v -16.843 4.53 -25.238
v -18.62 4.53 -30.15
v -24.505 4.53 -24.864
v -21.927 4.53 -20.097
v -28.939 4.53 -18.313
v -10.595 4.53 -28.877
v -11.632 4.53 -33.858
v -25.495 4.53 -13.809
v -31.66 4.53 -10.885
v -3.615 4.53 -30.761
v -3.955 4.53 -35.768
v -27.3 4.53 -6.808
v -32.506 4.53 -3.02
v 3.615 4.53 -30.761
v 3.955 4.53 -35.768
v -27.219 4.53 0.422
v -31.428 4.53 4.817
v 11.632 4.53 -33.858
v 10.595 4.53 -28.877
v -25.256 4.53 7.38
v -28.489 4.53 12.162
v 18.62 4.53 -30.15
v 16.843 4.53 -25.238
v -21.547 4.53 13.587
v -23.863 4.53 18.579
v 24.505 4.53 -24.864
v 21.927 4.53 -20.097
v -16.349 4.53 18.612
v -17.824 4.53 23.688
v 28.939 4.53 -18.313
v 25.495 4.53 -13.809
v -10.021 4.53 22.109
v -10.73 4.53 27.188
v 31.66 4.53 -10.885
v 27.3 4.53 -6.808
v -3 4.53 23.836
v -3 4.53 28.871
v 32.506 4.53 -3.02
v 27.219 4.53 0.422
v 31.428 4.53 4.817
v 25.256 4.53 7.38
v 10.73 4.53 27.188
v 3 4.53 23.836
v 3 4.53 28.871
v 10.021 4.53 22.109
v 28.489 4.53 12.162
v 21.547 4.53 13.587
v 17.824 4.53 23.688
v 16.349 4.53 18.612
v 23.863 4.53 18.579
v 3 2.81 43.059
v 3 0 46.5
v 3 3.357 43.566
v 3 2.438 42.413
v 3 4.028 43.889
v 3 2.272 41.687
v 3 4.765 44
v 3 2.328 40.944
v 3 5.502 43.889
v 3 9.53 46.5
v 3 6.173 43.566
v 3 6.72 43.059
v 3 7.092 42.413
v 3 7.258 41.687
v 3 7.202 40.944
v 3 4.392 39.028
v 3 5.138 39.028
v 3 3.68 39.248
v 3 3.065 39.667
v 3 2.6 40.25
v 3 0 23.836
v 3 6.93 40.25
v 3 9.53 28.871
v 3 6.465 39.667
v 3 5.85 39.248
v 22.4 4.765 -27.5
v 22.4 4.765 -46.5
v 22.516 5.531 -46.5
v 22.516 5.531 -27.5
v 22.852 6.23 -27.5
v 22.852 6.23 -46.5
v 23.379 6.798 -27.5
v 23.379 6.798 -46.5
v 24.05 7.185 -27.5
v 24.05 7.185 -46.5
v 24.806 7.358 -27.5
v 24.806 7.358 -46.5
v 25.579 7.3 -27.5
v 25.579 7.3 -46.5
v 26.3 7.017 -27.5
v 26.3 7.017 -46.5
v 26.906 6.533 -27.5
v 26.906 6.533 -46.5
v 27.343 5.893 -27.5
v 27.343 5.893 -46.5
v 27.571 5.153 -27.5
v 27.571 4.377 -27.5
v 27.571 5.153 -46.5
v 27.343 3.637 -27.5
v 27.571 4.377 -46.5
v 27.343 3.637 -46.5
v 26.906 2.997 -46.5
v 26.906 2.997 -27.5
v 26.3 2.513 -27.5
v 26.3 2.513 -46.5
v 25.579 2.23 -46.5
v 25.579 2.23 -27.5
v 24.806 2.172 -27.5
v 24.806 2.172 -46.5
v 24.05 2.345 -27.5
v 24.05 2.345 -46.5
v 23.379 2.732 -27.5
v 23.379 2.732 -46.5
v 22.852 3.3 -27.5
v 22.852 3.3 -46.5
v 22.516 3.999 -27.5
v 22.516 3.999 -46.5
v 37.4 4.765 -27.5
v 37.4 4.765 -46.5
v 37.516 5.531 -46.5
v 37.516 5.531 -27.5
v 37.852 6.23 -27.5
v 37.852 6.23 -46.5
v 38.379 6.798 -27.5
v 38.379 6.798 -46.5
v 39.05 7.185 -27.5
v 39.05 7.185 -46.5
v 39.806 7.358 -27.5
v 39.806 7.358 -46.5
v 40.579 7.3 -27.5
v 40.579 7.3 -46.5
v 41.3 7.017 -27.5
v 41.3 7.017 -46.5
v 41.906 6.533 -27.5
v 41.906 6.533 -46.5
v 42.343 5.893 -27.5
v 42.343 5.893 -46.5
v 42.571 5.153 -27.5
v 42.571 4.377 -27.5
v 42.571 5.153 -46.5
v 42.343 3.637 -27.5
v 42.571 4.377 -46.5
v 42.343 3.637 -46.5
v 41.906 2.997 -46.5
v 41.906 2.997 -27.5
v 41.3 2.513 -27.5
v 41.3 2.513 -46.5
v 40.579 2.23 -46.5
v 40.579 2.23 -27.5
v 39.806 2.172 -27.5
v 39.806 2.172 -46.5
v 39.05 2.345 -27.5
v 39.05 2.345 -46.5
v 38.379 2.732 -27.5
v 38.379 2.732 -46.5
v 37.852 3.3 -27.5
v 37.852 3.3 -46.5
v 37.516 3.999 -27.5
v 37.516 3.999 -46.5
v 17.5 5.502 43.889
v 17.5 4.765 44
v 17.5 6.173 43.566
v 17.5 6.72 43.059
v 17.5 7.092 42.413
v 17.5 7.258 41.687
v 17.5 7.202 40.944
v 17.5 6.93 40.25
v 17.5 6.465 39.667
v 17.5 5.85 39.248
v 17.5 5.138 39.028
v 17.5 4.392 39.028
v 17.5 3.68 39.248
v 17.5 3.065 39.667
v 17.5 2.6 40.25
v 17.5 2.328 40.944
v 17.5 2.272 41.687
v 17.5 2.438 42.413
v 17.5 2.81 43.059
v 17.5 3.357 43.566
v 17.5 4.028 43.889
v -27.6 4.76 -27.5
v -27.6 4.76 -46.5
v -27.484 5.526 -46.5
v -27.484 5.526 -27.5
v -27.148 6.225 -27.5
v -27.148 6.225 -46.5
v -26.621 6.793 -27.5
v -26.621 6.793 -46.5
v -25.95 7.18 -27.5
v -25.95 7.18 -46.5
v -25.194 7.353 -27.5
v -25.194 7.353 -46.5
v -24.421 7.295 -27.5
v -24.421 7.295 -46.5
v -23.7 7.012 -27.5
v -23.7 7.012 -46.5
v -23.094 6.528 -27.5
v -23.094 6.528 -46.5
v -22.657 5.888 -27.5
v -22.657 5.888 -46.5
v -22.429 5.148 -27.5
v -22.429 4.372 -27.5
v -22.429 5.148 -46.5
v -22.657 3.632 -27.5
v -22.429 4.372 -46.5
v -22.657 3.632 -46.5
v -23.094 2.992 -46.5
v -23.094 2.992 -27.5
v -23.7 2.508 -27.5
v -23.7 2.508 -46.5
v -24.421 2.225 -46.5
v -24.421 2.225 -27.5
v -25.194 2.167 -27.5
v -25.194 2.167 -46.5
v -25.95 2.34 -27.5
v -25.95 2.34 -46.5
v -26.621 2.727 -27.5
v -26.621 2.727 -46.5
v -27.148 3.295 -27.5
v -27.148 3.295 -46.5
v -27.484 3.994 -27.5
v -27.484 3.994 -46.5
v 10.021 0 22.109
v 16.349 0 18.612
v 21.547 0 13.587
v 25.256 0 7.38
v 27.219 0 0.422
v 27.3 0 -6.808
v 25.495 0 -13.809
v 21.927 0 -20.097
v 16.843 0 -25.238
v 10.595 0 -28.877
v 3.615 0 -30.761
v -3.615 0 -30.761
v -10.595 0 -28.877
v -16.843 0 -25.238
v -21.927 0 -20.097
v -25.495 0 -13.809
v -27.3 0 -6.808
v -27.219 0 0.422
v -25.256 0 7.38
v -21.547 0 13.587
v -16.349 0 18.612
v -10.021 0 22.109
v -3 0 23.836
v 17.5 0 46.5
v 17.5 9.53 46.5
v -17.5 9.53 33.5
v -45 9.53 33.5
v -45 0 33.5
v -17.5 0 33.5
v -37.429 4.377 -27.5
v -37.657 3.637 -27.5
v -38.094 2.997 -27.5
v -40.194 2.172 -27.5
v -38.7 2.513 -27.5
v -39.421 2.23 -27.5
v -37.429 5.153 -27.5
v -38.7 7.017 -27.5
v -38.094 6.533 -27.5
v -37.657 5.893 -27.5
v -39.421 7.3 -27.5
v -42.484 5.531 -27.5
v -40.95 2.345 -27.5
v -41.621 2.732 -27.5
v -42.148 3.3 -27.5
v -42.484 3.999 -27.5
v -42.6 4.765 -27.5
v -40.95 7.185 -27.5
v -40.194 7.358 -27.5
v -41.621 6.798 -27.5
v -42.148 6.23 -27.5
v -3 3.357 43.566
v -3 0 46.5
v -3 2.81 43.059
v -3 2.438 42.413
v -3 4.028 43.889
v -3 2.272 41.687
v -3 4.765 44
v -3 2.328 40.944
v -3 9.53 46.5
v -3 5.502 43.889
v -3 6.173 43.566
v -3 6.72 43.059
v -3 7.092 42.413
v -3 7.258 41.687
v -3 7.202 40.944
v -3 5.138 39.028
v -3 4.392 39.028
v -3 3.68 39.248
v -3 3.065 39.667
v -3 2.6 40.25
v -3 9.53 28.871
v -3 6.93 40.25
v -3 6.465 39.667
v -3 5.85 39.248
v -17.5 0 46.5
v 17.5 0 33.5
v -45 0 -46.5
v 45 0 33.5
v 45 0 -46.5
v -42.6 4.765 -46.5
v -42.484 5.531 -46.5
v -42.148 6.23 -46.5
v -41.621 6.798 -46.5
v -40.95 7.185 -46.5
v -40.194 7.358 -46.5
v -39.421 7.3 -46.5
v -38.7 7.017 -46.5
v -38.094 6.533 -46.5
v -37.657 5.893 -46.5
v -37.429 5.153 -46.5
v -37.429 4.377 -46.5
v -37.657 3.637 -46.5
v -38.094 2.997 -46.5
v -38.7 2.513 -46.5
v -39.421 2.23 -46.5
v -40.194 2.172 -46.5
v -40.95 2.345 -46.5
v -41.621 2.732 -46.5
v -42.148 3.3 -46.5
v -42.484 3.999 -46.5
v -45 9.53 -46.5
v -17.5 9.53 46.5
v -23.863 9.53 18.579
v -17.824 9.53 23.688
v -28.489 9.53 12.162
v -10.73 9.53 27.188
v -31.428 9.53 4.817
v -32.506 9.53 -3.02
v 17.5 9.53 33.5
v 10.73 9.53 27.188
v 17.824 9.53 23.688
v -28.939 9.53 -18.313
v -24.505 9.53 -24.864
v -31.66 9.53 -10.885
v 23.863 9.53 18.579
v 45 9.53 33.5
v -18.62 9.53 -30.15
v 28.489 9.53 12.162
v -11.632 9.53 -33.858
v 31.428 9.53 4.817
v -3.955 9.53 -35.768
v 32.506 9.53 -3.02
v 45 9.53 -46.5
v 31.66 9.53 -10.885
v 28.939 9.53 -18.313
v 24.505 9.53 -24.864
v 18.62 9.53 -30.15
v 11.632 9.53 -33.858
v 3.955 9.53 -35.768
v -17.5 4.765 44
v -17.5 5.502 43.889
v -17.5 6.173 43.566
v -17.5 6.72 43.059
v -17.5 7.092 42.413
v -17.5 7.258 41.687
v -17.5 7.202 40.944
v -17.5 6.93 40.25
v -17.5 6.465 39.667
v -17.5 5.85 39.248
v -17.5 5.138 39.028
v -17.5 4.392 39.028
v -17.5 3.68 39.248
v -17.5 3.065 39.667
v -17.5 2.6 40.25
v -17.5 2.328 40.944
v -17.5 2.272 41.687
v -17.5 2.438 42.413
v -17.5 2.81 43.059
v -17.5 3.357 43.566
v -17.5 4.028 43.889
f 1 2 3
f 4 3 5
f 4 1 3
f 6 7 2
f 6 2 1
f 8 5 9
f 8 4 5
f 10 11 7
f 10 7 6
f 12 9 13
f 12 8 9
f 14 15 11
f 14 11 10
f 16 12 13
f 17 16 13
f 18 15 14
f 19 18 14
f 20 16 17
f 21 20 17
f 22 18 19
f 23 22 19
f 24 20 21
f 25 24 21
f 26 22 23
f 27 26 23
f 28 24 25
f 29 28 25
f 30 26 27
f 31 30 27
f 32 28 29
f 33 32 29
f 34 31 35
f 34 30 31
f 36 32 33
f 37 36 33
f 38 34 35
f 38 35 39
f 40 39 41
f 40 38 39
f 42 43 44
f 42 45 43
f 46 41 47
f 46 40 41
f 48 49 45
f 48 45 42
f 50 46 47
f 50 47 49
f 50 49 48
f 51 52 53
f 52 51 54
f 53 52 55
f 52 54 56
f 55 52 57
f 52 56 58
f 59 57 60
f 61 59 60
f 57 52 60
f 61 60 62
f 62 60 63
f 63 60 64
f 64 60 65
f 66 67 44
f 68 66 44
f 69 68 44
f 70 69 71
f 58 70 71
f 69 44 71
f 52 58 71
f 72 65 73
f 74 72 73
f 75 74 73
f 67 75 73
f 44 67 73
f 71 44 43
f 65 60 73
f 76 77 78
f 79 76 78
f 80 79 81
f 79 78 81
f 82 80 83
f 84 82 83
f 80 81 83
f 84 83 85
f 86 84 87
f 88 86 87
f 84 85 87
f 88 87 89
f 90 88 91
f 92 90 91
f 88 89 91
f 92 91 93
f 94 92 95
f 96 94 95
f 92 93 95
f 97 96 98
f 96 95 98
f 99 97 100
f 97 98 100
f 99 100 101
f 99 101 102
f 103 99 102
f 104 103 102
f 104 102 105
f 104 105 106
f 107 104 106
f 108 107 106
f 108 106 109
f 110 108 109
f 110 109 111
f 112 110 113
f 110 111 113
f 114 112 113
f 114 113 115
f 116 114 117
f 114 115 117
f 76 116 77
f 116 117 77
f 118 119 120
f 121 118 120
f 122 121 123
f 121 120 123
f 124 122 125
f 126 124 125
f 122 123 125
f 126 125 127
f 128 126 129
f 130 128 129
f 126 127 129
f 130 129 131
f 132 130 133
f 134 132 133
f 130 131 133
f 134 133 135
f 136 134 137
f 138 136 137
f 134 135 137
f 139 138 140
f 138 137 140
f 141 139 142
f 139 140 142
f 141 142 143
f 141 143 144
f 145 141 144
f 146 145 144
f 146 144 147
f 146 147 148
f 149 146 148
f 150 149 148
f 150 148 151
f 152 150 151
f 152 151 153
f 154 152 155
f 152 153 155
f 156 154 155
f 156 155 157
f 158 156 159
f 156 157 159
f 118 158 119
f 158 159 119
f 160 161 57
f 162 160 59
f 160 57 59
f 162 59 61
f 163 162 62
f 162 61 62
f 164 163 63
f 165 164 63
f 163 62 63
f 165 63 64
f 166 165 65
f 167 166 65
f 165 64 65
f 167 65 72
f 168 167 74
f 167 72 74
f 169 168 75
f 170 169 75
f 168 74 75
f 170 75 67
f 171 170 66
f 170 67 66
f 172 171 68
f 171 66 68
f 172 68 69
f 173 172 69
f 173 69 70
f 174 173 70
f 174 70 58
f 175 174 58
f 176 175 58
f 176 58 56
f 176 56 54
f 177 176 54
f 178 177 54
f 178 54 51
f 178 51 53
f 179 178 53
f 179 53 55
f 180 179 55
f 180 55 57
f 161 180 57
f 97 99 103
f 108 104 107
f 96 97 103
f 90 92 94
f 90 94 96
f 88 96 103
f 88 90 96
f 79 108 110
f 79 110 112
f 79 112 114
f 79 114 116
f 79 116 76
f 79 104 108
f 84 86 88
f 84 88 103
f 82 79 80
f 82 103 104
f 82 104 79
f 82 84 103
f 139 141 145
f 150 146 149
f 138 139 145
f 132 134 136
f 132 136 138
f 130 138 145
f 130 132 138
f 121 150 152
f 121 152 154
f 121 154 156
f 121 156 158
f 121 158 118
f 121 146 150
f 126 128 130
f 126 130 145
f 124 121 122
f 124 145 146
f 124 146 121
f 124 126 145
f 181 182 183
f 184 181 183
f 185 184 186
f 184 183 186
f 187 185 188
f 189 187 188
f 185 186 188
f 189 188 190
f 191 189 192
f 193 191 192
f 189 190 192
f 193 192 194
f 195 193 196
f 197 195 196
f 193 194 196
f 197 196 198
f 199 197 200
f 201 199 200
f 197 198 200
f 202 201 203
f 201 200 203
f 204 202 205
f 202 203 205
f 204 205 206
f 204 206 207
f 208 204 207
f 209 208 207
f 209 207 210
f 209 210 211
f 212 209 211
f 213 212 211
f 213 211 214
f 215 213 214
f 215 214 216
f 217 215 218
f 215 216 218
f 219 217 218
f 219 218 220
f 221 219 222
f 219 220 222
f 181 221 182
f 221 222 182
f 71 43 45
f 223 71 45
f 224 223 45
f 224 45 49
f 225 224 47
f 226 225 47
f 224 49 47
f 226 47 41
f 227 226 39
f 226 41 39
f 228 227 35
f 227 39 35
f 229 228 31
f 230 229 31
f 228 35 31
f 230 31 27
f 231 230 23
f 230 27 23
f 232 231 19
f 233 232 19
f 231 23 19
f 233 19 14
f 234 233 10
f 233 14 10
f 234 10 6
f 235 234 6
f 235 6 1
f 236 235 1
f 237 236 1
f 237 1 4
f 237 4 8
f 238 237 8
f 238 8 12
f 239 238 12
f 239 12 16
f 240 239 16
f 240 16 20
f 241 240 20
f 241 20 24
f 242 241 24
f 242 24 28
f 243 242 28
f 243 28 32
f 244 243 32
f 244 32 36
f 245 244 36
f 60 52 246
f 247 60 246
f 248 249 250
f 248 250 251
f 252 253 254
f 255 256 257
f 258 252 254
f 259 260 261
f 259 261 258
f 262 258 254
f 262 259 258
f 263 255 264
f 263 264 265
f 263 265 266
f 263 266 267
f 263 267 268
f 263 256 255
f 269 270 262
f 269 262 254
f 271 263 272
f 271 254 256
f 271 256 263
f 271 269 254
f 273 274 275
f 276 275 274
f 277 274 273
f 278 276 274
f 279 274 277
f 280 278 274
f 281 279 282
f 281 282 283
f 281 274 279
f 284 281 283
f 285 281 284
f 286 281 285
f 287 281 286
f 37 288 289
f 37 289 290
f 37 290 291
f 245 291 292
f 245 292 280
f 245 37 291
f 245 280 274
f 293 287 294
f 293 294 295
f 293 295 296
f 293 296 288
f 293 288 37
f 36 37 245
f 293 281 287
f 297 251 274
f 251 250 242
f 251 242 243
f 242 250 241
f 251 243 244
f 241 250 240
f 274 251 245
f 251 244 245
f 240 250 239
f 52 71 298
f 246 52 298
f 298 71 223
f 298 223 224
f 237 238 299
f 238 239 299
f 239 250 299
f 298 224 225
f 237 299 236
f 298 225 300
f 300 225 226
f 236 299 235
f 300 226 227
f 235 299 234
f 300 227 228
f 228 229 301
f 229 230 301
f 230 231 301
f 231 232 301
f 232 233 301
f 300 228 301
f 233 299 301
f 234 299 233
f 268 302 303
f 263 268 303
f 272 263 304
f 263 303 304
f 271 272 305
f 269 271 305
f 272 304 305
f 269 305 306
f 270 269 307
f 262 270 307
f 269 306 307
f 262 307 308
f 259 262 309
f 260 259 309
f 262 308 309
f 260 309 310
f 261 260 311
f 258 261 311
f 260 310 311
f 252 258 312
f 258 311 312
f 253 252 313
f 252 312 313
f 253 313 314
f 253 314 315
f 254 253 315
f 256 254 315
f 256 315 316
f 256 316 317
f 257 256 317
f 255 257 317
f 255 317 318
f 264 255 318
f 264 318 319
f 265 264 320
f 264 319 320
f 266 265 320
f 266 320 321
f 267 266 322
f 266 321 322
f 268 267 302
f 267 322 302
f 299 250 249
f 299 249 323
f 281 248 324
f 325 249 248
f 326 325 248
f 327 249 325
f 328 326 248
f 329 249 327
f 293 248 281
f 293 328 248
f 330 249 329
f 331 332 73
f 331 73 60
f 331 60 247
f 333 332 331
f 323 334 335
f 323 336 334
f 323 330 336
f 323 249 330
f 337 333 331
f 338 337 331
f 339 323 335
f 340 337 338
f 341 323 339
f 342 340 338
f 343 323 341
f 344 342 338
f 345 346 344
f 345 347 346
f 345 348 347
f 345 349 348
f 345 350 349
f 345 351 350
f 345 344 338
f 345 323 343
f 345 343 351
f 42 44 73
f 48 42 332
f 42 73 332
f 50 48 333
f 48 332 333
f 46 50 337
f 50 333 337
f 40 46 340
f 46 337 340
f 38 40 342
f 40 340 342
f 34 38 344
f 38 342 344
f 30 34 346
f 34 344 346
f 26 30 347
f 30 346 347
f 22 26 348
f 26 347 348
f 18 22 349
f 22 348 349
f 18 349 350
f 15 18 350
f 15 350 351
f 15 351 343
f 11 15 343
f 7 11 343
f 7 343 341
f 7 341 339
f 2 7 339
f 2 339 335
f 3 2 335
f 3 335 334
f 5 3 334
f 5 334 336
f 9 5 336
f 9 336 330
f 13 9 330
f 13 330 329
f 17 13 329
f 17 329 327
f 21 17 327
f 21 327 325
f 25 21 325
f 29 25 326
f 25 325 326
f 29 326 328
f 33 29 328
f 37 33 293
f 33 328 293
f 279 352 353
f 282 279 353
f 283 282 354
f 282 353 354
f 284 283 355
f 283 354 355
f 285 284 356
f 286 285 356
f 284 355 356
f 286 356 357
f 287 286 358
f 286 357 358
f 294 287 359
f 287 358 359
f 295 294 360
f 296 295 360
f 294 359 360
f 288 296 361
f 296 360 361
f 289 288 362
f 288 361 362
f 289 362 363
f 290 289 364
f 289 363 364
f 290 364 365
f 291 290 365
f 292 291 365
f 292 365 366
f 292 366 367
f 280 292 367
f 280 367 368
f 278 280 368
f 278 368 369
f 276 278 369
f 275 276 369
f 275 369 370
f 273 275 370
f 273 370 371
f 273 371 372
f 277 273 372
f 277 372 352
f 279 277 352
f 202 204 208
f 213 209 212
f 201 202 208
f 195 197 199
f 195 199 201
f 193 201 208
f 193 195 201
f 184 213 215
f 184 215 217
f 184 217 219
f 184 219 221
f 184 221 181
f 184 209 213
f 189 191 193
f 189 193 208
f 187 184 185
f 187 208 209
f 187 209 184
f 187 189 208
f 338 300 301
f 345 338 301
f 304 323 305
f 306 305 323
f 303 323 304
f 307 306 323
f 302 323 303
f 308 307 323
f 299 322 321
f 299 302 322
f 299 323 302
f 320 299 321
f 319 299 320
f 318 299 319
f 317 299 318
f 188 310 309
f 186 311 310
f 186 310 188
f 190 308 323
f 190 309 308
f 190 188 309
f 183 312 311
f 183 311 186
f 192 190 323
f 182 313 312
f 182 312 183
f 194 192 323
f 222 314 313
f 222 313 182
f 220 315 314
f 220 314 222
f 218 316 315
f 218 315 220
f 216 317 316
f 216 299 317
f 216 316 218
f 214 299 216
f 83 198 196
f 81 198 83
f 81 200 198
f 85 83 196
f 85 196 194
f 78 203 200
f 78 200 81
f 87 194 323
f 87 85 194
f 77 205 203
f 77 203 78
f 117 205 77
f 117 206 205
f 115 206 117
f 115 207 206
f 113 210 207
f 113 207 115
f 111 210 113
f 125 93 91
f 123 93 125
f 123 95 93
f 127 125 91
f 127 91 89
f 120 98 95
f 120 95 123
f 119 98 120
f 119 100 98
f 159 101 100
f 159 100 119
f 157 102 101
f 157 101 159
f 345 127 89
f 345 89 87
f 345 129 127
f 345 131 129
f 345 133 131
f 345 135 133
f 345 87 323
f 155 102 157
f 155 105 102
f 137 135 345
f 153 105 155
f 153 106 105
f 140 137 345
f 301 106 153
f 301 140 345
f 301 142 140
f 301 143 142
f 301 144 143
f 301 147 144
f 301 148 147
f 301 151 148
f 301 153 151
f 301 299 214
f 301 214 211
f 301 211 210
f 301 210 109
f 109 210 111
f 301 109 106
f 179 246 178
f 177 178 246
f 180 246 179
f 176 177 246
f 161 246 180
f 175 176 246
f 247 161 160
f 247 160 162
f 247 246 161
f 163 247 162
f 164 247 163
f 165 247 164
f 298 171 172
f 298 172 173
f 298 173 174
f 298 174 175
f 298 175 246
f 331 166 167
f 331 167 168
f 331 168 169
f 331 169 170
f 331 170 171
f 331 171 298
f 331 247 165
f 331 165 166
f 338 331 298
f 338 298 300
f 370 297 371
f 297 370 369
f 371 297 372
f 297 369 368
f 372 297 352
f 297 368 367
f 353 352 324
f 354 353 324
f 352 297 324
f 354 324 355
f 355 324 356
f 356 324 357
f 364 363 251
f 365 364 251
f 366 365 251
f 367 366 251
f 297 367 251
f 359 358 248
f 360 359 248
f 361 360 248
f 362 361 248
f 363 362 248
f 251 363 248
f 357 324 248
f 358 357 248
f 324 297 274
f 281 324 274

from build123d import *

# Parameters (mm, degrees)
ESBO_O1_W                = 90
ESBO_O1_H                = 93
RESSALTO_EXTRUS_O1_DEPTH = 9.53
ESBO_O3_R                = 32.51
CORTE_EXTRUS_O2_DEPTH    = 5
ESBO_O2_R                = 2.6
CORTE_EXTRUS_O1_DEPTH    = 19
CORTE_EXTRUS_O3_REACH    = 66.902
ESBO_O4_R                = 27.5
CORTE_EXTRUS_O4_REACH    = 67.407
ESBO_O5_W                = 27.5
ESBO_O5_H                = 13
CORTE_EXTRUS_O5_REACH    = 67.407
ESBO_O6_W                = 6
ESBO_O6_H                = 26.167415493
CORTE_EXTRUS_O6_REACH    = 80.481
ESBO_O7_R                = 2.5


with BuildPart() as part:
    # Esboço1 → Ressalto-extrusão1 (new body)
    with BuildSketch(Plane(origin=(0, 0, 0), x_dir=(1, 0, 0), z_dir=(0, 1, 0))):
        Rectangle(ESBO_O1_W, ESBO_O1_H)
    extrude(amount=RESSALTO_EXTRUS_O1_DEPTH)

    # Esboço3 → Corte-extrusão2 (cut)
    with BuildSketch(Plane(origin=(0, 9.53, 0), x_dir=(1, 0, 0), z_dir=(0, 1, 0))):
        with Locations(Location((0, 3.5, 0), (0, 0, 270))):
            Circle(ESBO_O3_R)
    extrude(amount=-CORTE_EXTRUS_O2_DEPTH, mode=Mode.SUBTRACT)

    # Esboço2 → Corte-extrusão1 (cut)
    with BuildSketch(Plane(origin=(0, 0, -46.5), x_dir=(-1, 0, 0), z_dir=(0, 0, -1))):
        with Locations((-40, 4.765)):
            Circle(ESBO_O2_R)
        with Locations((-25, 4.765)):
            Circle(ESBO_O2_R)
        with Locations((25, 4.76)):
            Circle(ESBO_O2_R)
        with Locations((40, 4.765)):
            Circle(ESBO_O2_R)
    extrude(amount=-CORTE_EXTRUS_O1_DEPTH, mode=Mode.SUBTRACT)

    # Esboço4 → Corte-extrusão3 (cut, up to next)
    with BuildSketch(Plane(origin=(0, 4.53, 0), x_dir=(1, 0, 0), z_dir=(0, 1, 0)), mode=Mode.PRIVATE) as corte_extrus_o3_sk1:
        with Locations(Location((0, 3.5, 0), (0, 0, 270))):
            Circle(ESBO_O4_R)
    corte_extrus_o3_tool1 = extrude(corte_extrus_o3_sk1.sketch, amount=-CORTE_EXTRUS_O3_REACH, mode=Mode.PRIVATE) & part.part
    add(corte_extrus_o3_tool1.solids().sort_by_distance((0, 4.53, -3.5))[0], mode=Mode.SUBTRACT)

    # Esboço5 → Corte-extrusão4 (cut, up to next)
    with BuildSketch(Plane(origin=(0, 9.53, 0), x_dir=(1, 0, 0), z_dir=(0, 1, 0)), mode=Mode.PRIVATE) as corte_extrus_o4_sk1:
        with Locations((31.25, -40)):
            Rectangle(ESBO_O5_W, ESBO_O5_H)
    corte_extrus_o4_tool1 = extrude(corte_extrus_o4_sk1.sketch, amount=-CORTE_EXTRUS_O4_REACH, mode=Mode.PRIVATE) & part.part
    # Esboço5 → Corte-extrusão4 (cut, up to next)
    with BuildSketch(Plane(origin=(0, 9.53, 0), x_dir=(1, 0, 0), z_dir=(0, 1, 0)), mode=Mode.PRIVATE) as corte_extrus_o4_sk2:
        with Locations((-31.25, -40)):
            Rectangle(ESBO_O5_W, ESBO_O5_H)
    corte_extrus_o4_tool2 = extrude(corte_extrus_o4_sk2.sketch, amount=-CORTE_EXTRUS_O4_REACH, mode=Mode.PRIVATE) & part.part
    add(corte_extrus_o4_tool1.solids().sort_by_distance((31.25, 9.53, 40))[0], mode=Mode.SUBTRACT)
    add(corte_extrus_o4_tool2.solids().sort_by_distance((-31.25, 9.53, 40))[0], mode=Mode.SUBTRACT)

    # Esboço6 → Corte-extrusão5 (cut, up to next)
    with BuildSketch(Plane(origin=(0, 9.53, 0), x_dir=(1, 0, 0), z_dir=(0, 1, 0)), mode=Mode.PRIVATE) as corte_extrus_o5_sk1:
        with Locations((0, -33.416292254)):
            Rectangle(ESBO_O6_W, ESBO_O6_H)
    corte_extrus_o5_tool1 = extrude(corte_extrus_o5_sk1.sketch, amount=-CORTE_EXTRUS_O5_REACH, mode=Mode.PRIVATE) & part.part
    add(corte_extrus_o5_tool1.solids().sort_by_distance((0, 9.53, 33.416292))[0], mode=Mode.SUBTRACT)

    # Corte-extrusão6: up to this face of the body (flat: up to its plane)
    corte_extrus_o6_end = Plane(part.part.faces().sort_by_distance((17.5, 4.765, 40))[0])
    # Esboço7 → Corte-extrusão6 (cut, up to the picked face)
    with BuildSketch(Plane.ZY.offset(17.5), mode=Mode.PRIVATE) as corte_extrus_o6_sk1:
        with Locations((41.5, 4.765)):
            Circle(ESBO_O7_R)
    corte_extrus_o6_tool1 = split(extrude(corte_extrus_o6_sk1.sketch, amount=-CORTE_EXTRUS_O6_REACH, mode=Mode.PRIVATE), bisect_by=corte_extrus_o6_end, keep=Keep.BOTH, mode=Mode.PRIVATE)
    add(corte_extrus_o6_tool1.solids().sort_by(Axis((-17.5, 4.765, 41.5), (1, 0, 0)))[0], mode=Mode.SUBTRACT)


solid = part.part
